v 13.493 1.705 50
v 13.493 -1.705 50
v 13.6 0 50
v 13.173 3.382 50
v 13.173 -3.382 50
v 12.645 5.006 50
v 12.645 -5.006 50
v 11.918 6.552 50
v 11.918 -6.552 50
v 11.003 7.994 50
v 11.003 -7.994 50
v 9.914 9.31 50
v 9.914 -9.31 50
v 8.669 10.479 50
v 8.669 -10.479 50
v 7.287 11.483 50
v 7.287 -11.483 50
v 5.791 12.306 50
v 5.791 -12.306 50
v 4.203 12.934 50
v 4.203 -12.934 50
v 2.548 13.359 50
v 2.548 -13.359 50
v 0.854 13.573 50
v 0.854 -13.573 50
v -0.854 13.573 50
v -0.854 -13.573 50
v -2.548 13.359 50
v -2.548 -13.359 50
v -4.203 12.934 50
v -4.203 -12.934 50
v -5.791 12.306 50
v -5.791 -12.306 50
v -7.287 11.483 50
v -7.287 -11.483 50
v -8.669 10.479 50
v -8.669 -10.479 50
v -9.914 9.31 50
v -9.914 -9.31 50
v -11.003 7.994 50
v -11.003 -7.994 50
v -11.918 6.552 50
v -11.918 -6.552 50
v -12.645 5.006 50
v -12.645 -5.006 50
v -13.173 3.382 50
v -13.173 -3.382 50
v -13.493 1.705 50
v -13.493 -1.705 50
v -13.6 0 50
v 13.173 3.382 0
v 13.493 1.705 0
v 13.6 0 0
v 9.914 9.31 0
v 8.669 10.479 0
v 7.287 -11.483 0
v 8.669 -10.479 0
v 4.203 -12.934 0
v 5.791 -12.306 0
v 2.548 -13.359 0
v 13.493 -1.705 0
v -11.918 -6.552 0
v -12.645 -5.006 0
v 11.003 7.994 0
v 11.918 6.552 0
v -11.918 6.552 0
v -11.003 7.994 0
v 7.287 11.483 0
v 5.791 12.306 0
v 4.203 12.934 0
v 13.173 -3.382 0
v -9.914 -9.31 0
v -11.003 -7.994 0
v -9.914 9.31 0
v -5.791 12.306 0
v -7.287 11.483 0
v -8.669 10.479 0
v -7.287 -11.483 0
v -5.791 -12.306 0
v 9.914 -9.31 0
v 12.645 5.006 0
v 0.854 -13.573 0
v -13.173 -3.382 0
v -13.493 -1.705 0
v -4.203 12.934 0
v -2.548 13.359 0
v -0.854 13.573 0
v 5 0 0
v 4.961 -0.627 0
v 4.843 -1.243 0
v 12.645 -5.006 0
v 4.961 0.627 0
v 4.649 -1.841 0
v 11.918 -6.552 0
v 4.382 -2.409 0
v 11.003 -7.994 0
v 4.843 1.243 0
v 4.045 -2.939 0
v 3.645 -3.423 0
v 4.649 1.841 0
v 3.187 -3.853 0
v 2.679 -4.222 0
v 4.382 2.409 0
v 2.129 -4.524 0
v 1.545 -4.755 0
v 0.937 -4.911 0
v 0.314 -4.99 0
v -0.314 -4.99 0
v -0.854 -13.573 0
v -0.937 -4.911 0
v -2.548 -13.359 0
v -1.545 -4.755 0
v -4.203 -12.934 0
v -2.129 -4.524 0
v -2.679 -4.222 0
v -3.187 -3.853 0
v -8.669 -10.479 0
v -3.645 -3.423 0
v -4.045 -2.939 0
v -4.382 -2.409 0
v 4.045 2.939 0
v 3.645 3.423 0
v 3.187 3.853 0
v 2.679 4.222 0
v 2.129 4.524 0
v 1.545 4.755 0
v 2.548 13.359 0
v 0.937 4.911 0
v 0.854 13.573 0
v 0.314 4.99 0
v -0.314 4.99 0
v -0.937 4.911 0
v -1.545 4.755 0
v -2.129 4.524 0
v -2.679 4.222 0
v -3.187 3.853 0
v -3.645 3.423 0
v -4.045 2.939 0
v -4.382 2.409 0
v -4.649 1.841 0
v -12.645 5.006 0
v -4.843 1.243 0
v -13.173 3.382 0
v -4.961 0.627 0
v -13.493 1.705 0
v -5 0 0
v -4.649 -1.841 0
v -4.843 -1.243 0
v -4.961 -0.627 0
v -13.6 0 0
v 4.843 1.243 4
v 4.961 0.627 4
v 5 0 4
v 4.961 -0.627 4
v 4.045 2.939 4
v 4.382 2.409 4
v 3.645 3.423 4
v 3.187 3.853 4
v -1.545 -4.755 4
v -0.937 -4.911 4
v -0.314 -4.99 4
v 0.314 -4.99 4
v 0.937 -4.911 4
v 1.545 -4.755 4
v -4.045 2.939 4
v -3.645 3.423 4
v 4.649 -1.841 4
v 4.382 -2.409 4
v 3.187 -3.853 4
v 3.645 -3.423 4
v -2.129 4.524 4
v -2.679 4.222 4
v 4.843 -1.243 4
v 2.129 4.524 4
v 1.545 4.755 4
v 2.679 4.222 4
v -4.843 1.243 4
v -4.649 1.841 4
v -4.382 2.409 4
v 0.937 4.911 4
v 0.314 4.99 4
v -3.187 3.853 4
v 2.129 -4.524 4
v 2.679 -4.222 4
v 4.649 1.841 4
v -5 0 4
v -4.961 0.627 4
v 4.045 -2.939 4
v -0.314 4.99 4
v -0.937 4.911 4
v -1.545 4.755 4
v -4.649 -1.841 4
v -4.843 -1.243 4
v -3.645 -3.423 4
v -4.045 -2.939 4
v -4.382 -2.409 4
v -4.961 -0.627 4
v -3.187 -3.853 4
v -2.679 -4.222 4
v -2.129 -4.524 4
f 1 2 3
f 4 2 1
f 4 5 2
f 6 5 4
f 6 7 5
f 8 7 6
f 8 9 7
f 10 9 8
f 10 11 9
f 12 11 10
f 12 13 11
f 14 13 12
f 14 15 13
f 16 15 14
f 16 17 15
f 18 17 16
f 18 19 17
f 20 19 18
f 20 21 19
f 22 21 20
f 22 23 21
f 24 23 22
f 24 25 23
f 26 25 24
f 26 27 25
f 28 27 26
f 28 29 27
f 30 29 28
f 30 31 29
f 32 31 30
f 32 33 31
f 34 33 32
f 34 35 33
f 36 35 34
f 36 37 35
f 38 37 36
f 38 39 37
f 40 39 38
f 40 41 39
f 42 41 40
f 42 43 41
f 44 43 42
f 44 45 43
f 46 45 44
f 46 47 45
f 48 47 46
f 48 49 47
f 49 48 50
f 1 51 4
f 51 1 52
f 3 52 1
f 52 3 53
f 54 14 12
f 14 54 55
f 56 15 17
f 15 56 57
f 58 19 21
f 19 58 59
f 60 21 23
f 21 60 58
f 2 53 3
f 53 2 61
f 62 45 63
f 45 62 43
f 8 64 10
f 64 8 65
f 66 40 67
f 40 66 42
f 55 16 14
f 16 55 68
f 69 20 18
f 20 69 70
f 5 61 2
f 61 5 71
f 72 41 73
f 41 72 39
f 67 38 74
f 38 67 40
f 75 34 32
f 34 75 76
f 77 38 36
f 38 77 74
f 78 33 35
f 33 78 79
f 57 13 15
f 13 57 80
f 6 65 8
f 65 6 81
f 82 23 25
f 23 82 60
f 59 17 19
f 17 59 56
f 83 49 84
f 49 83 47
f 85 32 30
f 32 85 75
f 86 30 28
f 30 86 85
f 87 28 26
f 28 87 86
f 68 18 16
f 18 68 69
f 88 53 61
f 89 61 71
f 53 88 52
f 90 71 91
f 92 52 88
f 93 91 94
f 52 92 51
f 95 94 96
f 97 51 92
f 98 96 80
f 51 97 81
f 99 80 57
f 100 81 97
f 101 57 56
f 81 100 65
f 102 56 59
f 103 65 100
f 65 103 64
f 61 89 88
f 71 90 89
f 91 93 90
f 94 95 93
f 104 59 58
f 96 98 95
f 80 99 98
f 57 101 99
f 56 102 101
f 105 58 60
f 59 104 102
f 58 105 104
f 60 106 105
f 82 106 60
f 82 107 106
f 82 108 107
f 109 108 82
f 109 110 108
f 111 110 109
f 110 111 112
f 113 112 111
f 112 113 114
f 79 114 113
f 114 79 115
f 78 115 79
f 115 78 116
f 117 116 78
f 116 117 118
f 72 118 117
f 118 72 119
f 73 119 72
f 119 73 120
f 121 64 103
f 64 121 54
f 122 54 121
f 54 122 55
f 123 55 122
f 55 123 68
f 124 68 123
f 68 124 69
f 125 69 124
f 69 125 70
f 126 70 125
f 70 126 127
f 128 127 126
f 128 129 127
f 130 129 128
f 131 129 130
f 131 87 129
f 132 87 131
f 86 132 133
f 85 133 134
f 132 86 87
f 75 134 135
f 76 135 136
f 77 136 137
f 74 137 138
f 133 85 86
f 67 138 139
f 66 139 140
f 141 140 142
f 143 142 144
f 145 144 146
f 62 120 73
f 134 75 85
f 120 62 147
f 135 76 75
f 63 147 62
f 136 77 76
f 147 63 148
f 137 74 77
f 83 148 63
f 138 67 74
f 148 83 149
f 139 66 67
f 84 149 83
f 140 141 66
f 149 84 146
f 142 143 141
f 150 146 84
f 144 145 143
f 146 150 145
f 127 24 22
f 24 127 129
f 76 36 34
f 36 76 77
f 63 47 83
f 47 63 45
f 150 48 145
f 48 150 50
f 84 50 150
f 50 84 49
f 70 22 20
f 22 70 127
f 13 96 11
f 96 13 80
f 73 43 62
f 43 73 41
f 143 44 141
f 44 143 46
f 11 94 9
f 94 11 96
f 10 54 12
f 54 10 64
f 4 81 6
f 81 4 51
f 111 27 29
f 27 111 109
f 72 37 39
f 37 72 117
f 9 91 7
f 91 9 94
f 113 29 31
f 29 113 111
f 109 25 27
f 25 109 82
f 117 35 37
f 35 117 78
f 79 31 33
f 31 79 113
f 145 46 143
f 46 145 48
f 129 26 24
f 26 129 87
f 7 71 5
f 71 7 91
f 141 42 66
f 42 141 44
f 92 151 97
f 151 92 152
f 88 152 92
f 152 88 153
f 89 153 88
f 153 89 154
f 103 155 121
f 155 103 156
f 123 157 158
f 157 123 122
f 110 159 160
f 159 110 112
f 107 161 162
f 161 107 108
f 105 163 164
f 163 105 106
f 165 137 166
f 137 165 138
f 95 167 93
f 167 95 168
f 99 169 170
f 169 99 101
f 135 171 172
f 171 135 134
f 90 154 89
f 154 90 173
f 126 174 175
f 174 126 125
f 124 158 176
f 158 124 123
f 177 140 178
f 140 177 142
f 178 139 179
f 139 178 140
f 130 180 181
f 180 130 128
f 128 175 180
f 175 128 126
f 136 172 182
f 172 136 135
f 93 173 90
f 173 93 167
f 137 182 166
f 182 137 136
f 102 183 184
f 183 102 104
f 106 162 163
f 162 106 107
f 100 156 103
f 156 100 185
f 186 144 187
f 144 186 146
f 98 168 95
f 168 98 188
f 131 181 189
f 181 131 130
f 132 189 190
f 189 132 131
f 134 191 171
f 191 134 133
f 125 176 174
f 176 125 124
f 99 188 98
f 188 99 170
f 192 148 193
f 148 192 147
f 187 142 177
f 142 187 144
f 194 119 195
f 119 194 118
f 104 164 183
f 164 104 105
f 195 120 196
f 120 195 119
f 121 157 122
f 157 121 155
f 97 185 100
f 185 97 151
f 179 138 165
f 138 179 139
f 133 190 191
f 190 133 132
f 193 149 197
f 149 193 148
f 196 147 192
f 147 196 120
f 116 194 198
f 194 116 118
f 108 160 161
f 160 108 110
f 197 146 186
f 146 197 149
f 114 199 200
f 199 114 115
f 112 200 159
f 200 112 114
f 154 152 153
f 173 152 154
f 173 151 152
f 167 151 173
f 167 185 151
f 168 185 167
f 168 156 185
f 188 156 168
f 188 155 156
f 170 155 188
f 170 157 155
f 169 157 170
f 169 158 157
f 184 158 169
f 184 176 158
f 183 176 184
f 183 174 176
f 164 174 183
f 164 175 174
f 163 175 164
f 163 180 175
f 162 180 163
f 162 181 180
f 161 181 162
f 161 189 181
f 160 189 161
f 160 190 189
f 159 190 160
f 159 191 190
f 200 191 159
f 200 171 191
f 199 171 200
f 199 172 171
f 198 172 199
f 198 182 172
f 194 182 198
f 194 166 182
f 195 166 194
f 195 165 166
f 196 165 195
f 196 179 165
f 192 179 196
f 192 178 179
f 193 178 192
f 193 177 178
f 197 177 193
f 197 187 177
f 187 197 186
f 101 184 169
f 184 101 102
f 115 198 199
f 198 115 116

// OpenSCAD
$fn = 50;

difference(){
cylinder(50, r=13.6, true);
translate([0,0,-1]){
cylinder(5, r=5, true);
}}
